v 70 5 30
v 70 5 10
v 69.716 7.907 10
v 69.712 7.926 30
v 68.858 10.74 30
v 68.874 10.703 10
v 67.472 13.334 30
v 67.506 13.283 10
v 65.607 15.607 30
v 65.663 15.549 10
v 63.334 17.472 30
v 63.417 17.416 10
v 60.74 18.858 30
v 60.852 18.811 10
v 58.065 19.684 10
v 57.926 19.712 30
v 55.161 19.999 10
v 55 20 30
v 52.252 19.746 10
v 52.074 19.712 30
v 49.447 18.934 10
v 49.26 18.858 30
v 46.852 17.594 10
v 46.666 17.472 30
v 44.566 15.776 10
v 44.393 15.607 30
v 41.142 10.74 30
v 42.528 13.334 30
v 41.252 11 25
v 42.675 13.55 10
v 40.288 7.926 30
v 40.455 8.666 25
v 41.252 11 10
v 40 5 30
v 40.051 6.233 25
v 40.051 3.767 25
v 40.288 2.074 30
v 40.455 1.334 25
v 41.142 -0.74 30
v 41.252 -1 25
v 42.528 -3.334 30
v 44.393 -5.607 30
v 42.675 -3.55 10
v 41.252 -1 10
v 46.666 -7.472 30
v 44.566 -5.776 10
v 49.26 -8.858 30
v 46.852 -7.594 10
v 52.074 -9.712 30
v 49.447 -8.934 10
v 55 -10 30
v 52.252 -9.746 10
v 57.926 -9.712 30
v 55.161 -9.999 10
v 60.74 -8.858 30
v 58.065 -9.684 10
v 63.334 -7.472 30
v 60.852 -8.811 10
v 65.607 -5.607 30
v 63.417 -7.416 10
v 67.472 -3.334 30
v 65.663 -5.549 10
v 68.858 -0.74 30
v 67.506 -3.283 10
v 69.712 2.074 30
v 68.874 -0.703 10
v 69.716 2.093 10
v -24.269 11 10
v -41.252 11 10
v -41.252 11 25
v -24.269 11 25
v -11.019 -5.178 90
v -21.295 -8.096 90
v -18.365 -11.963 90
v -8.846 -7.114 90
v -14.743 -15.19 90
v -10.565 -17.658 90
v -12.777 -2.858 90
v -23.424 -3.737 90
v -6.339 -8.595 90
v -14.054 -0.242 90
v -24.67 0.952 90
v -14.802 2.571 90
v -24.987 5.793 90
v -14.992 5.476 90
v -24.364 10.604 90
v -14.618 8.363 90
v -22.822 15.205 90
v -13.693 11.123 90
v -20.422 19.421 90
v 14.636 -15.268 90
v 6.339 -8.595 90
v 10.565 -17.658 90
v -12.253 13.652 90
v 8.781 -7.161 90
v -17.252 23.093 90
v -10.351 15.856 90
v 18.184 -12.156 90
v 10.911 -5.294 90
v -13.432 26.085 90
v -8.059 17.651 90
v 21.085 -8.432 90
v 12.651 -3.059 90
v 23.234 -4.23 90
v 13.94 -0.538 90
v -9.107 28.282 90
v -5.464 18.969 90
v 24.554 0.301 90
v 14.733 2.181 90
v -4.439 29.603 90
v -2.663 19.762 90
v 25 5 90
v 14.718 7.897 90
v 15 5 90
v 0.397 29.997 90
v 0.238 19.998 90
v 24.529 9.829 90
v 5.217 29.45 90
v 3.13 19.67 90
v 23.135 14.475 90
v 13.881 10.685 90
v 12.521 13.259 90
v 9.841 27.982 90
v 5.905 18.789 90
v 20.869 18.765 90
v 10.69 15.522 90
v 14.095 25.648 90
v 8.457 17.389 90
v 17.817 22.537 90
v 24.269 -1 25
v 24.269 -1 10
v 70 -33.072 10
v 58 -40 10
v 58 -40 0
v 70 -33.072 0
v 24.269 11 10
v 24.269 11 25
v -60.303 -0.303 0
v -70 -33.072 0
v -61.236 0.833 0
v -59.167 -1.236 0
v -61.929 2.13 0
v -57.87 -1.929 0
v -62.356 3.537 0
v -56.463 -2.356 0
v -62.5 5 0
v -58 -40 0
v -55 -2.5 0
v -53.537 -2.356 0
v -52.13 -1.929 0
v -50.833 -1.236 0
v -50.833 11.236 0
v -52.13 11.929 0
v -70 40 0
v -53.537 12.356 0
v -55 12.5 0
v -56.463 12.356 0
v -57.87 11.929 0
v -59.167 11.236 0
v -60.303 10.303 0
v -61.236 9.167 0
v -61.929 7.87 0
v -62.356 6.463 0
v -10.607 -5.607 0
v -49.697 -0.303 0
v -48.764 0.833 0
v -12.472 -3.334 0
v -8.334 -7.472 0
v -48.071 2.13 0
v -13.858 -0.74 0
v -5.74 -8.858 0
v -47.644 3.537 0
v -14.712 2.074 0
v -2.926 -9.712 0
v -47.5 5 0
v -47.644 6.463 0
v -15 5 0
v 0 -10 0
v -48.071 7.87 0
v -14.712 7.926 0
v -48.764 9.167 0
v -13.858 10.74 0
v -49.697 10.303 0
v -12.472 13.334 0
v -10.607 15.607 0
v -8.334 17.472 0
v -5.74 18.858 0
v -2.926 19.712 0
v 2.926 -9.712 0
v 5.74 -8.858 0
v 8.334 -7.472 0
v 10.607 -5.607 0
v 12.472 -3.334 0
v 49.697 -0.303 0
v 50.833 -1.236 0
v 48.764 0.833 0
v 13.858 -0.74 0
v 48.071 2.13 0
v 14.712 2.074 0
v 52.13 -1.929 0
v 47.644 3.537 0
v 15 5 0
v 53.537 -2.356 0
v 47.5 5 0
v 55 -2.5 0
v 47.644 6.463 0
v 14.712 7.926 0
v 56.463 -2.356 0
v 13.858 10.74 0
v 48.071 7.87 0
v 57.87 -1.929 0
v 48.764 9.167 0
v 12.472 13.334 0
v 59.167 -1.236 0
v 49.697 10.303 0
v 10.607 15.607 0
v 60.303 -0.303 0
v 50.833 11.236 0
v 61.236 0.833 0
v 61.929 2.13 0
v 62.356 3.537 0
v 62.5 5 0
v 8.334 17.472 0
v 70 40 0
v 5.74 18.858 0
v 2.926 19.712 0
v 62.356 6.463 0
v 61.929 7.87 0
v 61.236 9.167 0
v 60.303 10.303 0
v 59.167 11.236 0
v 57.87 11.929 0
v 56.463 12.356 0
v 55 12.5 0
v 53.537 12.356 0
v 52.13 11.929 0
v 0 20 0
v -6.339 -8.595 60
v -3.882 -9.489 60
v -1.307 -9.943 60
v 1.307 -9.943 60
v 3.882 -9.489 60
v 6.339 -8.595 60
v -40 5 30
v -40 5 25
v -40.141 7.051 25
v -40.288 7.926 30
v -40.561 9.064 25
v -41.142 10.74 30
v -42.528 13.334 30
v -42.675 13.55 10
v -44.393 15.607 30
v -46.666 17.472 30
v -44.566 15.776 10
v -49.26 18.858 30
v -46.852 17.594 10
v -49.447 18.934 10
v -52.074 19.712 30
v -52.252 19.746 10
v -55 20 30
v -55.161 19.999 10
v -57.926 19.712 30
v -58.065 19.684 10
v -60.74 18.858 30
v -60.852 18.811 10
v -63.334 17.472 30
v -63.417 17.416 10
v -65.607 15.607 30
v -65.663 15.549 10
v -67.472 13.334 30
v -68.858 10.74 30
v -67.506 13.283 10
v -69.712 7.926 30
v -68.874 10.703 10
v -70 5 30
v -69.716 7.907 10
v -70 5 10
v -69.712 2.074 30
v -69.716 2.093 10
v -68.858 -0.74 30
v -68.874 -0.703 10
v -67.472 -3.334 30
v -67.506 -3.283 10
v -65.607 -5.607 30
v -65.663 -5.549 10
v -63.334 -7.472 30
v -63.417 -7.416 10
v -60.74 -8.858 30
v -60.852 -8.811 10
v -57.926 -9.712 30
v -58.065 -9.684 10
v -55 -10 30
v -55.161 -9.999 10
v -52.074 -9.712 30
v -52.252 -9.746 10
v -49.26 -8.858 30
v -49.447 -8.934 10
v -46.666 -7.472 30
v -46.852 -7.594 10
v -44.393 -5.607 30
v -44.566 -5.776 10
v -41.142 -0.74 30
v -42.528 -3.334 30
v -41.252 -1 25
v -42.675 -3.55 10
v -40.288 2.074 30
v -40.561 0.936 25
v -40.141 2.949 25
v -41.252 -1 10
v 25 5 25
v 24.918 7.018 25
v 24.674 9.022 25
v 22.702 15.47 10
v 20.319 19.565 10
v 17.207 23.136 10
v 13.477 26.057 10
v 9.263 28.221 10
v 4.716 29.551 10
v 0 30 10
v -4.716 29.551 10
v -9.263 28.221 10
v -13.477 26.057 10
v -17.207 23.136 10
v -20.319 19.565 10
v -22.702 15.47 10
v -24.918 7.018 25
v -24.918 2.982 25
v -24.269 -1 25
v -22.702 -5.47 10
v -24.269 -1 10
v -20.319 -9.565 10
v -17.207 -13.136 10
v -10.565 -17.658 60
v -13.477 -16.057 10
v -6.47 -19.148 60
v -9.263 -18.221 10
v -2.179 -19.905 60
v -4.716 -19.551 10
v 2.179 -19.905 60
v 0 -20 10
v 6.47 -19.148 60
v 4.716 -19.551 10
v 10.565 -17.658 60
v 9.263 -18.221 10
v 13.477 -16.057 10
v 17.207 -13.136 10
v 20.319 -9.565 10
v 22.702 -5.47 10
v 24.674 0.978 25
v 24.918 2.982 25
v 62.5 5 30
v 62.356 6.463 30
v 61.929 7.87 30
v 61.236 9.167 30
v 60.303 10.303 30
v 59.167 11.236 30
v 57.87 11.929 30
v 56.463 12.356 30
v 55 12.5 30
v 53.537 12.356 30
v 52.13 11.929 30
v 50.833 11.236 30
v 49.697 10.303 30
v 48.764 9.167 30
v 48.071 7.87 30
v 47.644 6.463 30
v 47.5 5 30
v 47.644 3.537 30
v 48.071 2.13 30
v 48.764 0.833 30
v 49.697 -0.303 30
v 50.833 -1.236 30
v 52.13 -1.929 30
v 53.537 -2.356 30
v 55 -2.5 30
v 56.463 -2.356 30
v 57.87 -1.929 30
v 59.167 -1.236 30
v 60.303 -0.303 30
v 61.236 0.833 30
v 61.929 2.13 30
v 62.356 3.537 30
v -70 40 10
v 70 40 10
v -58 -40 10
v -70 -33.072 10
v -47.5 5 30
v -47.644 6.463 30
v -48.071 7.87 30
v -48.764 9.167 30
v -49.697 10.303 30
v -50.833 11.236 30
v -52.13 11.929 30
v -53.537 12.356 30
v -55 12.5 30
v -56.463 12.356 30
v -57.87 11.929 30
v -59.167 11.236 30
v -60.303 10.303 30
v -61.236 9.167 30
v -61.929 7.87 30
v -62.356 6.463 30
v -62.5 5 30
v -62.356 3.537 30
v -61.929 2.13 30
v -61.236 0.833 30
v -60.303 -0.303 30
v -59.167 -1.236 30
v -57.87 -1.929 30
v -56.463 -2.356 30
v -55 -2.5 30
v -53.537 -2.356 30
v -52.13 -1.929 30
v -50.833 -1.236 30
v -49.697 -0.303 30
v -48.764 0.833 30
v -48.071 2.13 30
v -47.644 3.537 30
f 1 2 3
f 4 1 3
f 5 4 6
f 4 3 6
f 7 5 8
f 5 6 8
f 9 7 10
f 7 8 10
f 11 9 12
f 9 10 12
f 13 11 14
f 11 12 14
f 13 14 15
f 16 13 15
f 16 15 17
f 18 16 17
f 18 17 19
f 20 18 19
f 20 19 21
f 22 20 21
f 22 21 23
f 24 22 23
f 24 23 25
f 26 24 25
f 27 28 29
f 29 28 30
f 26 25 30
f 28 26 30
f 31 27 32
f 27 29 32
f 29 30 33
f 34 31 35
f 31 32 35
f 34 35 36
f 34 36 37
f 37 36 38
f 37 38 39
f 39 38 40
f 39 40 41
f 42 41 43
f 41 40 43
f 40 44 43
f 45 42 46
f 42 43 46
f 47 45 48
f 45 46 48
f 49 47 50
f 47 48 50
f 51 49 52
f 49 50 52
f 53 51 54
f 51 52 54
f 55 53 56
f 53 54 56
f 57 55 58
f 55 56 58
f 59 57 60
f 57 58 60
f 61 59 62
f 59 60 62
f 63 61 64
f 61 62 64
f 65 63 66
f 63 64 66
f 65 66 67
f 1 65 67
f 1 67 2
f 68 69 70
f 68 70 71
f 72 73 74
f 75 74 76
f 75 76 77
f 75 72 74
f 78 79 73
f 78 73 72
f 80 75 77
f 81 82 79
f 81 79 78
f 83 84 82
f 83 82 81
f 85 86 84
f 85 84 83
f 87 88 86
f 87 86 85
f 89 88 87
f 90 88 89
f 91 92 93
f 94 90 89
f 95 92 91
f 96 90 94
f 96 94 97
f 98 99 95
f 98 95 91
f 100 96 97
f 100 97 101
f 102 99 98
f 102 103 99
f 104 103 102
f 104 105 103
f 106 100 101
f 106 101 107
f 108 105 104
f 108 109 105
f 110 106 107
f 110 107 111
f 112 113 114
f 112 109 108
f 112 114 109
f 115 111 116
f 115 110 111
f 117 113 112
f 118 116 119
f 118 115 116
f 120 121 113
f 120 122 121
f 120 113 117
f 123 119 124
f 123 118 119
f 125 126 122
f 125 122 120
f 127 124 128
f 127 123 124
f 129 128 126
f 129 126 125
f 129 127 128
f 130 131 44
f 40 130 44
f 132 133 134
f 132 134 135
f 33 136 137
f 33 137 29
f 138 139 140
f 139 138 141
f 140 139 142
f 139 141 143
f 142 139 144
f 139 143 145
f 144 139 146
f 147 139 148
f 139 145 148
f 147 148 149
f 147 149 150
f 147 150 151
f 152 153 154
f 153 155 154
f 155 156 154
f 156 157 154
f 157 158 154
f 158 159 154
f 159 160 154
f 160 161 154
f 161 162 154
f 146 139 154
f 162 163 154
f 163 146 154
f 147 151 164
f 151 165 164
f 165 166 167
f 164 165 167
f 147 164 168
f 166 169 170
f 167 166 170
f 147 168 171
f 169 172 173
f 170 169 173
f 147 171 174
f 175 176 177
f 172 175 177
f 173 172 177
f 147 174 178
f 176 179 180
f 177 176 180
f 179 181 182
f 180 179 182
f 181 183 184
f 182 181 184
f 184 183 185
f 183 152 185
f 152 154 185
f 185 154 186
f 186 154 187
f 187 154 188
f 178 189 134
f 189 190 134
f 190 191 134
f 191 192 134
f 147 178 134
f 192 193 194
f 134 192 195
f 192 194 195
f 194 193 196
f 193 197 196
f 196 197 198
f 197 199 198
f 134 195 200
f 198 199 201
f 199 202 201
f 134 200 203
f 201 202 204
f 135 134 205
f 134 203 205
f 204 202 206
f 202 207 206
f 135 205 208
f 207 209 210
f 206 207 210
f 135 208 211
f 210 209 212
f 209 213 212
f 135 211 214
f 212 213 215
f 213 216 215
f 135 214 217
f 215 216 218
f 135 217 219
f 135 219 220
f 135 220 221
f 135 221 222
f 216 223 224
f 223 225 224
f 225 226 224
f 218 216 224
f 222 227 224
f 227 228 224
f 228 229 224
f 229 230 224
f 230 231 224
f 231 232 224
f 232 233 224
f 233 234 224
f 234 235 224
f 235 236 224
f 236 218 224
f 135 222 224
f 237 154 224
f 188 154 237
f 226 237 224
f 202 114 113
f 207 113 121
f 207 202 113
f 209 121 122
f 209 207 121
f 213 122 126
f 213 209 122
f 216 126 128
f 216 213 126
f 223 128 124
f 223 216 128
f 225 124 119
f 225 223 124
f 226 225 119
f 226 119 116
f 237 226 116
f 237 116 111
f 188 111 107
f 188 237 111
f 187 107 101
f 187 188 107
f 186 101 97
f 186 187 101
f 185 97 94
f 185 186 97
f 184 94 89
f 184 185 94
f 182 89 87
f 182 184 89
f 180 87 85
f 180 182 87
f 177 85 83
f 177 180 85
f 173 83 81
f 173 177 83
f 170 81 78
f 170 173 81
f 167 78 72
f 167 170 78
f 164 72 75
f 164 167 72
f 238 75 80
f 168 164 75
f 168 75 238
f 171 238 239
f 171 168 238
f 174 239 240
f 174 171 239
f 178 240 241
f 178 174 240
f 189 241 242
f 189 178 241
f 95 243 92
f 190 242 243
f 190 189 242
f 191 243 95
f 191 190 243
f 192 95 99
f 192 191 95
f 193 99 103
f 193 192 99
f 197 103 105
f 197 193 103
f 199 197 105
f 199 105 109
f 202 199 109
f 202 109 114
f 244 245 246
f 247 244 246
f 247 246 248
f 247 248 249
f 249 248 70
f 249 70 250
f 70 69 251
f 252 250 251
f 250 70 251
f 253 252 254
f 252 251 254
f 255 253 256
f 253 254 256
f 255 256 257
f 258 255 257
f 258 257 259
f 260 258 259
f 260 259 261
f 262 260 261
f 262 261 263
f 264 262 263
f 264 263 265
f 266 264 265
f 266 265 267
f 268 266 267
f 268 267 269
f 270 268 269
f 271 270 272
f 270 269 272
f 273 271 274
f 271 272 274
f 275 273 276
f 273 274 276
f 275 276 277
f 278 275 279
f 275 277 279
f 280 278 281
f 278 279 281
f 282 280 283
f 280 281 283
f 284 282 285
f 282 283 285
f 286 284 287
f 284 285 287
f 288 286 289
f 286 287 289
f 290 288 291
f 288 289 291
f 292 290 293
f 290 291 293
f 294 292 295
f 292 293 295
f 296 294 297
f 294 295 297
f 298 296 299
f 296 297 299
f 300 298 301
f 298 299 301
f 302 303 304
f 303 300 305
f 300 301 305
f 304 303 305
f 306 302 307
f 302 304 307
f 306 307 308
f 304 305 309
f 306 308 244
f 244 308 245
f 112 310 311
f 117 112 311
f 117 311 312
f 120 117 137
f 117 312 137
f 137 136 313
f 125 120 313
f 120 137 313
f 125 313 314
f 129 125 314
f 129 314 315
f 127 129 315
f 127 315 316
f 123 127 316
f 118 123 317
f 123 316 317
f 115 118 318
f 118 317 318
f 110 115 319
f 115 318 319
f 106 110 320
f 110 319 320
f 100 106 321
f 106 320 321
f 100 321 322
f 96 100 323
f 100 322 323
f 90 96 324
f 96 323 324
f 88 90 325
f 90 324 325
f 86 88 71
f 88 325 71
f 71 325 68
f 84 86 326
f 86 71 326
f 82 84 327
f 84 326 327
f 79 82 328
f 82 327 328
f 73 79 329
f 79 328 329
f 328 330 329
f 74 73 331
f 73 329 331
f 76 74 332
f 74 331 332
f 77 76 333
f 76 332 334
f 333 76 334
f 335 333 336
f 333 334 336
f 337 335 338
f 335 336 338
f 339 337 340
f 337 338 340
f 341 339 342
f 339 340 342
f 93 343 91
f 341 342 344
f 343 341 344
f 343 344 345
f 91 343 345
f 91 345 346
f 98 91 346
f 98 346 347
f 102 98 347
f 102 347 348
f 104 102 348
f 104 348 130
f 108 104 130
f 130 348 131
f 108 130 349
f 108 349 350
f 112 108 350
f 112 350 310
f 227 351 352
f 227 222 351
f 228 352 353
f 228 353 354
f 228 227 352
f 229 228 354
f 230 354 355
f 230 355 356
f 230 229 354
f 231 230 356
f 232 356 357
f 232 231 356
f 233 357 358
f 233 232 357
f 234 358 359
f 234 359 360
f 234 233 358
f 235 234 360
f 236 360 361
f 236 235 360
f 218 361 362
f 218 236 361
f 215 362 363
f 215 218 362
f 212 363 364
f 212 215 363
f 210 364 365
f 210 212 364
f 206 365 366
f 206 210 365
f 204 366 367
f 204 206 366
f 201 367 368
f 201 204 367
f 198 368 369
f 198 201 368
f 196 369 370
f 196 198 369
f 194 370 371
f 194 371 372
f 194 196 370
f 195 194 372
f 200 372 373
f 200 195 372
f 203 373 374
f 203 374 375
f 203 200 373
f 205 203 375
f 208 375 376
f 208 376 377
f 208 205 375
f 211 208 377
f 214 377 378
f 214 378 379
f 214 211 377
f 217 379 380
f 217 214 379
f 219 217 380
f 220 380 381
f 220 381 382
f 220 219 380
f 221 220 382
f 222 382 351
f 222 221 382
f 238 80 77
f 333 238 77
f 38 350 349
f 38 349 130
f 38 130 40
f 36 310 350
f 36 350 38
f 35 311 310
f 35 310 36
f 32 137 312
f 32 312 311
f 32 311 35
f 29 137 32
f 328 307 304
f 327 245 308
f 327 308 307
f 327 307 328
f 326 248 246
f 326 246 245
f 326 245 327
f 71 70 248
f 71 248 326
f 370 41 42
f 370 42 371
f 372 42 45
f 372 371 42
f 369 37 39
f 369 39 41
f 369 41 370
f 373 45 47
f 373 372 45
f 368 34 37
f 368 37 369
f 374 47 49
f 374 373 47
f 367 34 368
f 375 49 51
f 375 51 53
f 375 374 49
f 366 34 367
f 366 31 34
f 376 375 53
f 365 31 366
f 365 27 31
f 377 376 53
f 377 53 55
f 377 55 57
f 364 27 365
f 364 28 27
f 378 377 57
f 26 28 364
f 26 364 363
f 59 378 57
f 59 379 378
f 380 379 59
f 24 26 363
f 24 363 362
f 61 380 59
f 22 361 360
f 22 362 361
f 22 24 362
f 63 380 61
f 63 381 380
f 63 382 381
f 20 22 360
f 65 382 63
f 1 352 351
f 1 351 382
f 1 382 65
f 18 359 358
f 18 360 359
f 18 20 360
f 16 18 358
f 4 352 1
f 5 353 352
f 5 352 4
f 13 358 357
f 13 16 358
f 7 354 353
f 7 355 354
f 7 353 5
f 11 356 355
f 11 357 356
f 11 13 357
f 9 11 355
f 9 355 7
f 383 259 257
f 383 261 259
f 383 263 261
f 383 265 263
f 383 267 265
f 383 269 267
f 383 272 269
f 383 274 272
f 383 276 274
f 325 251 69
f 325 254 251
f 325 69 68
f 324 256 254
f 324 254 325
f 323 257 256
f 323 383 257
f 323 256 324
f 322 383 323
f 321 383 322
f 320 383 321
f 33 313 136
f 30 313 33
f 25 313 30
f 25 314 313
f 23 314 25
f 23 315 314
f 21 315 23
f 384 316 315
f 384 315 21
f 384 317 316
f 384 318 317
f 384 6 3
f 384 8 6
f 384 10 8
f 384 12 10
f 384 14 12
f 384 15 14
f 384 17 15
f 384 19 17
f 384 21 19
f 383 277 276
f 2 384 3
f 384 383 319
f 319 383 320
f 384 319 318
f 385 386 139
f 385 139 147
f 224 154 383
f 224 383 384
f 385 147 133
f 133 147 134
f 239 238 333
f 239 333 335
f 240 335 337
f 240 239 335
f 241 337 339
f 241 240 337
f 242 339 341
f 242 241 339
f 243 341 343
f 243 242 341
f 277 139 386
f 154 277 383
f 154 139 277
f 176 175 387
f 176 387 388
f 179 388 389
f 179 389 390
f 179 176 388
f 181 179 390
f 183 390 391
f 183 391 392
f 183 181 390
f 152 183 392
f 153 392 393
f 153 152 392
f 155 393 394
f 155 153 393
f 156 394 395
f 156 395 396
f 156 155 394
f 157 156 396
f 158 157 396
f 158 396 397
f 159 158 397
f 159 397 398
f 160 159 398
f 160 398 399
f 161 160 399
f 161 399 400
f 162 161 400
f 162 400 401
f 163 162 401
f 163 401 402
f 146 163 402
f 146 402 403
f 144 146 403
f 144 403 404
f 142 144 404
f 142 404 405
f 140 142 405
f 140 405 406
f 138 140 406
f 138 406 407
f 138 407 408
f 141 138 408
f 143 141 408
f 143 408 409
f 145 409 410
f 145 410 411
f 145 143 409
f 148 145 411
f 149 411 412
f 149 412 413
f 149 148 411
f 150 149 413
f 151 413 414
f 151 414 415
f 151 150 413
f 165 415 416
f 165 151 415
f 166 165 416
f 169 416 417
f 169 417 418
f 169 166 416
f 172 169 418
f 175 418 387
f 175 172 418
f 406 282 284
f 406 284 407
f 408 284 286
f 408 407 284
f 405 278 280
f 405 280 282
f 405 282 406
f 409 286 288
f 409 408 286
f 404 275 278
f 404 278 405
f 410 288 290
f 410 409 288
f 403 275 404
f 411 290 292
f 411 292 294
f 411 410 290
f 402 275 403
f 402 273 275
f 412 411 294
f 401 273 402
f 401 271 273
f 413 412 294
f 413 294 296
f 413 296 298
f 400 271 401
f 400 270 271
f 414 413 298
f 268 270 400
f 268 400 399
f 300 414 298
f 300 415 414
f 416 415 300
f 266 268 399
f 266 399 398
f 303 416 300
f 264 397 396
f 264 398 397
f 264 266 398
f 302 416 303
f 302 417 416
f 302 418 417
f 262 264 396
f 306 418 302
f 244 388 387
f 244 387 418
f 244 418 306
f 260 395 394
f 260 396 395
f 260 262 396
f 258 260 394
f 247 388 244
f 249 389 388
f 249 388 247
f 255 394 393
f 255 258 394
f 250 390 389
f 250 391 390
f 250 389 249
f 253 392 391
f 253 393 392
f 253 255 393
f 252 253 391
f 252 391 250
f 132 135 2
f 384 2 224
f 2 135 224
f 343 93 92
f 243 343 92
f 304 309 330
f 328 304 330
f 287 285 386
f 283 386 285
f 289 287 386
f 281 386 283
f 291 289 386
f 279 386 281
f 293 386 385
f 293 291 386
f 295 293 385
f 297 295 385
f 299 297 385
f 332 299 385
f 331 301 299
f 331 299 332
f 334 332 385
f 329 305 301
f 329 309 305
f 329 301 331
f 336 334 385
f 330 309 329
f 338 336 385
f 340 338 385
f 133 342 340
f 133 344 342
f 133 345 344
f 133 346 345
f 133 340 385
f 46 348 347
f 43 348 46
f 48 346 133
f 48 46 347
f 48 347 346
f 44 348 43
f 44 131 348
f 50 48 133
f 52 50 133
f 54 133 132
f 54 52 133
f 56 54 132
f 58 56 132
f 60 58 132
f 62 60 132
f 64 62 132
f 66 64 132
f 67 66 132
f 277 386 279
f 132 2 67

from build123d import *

# Parameters (mm, degrees)
SKETCH_W        = 140
SKETCH_H        = 80
SKETCH_R        = 7.5
SKETCH_R_2      = 15
PAD_DEPTH       = 10
POCKET_DEPTH    = 11
SKETCH004_R     = 25
SKETCH004_R_2   = 15
PAD001_DEPTH    = 80
SKETCH005_R     = 15
SKETCH005_R_2   = 7.5
PAD002_DEPTH    = 20
SKETCH006_W     = 26
SKETCH006_H     = 12
PAD003_DEPTH    = 15
POCKET001_DEPTH = 30


with BuildPart() as part:
    # Sketch → Pad (new body)
    with BuildSketch(Plane.XY):
        Rectangle(SKETCH_W, SKETCH_H)
        with Locations((-55, 5)):
            Circle(SKETCH_R, mode=Mode.SUBTRACT)
        with Locations((55, 5)):
            Circle(SKETCH_R, mode=Mode.SUBTRACT)
        with Locations((0, 5)):
            Circle(SKETCH_R_2, mode=Mode.SUBTRACT)
    extrude(amount=PAD_DEPTH)

    # Sketch001 (on Face9 of Pad) → Pocket (cut)
    with BuildSketch(Plane.XY.offset(10)):
        Polygon((-70, -33.071797), (-58, -40), (-70, -40), align=None)
        Polygon((70, -33.071797), (70, -40), (58, -40), align=None)
    extrude(amount=-POCKET_DEPTH, mode=Mode.SUBTRACT)

    # Sketch004 → Pad001 (join)
    with BuildSketch(Plane.XY.offset(10)):
        with Locations((0, 5)):
            Circle(SKETCH004_R)
        with Locations((0, 5)):
            Circle(SKETCH004_R_2, mode=Mode.SUBTRACT)
    extrude(amount=PAD001_DEPTH)

    # Sketch005 (on Face4 of Pad001) → Pad002 (join)
    with BuildSketch(Plane.XY.offset(10)):
        with Locations((55, 5)):
            Circle(SKETCH005_R)
        with Locations((55, 5)):
            Circle(SKETCH005_R_2, mode=Mode.SUBTRACT)
        with Locations((-55, 5)):
            Circle(SKETCH005_R)
        with Locations((-55, 5)):
            Circle(SKETCH005_R_2, mode=Mode.SUBTRACT)
    extrude(amount=PAD002_DEPTH)

    # Sketch006 (on Face4 of Pad002) → Pad003 (join)
    with BuildSketch(Plane.XY.offset(10)):
        with Locations((-33.01482, 5)):
            Rectangle(SKETCH006_W, SKETCH006_H)
        with Locations((33.01482, 5)):
            Rectangle(SKETCH006_W, SKETCH006_H)
    extrude(amount=PAD003_DEPTH)

    # Sketch007 (on Face21 of Pad003) → Pocket001 (cut)
    with BuildSketch(Plane.XY.offset(90)):
        with BuildLine():
            ThreePointArc((-10.565449, -17.657698), (1e-06, -20), (10.56545, -17.657698))
            Line((10.56545, -17.657698), (0, 5))
            Line((0, 5), (-10.565449, -17.657698))
        make_face()
    extrude(amount=-POCKET001_DEPTH, mode=Mode.SUBTRACT)


solid = part.part
